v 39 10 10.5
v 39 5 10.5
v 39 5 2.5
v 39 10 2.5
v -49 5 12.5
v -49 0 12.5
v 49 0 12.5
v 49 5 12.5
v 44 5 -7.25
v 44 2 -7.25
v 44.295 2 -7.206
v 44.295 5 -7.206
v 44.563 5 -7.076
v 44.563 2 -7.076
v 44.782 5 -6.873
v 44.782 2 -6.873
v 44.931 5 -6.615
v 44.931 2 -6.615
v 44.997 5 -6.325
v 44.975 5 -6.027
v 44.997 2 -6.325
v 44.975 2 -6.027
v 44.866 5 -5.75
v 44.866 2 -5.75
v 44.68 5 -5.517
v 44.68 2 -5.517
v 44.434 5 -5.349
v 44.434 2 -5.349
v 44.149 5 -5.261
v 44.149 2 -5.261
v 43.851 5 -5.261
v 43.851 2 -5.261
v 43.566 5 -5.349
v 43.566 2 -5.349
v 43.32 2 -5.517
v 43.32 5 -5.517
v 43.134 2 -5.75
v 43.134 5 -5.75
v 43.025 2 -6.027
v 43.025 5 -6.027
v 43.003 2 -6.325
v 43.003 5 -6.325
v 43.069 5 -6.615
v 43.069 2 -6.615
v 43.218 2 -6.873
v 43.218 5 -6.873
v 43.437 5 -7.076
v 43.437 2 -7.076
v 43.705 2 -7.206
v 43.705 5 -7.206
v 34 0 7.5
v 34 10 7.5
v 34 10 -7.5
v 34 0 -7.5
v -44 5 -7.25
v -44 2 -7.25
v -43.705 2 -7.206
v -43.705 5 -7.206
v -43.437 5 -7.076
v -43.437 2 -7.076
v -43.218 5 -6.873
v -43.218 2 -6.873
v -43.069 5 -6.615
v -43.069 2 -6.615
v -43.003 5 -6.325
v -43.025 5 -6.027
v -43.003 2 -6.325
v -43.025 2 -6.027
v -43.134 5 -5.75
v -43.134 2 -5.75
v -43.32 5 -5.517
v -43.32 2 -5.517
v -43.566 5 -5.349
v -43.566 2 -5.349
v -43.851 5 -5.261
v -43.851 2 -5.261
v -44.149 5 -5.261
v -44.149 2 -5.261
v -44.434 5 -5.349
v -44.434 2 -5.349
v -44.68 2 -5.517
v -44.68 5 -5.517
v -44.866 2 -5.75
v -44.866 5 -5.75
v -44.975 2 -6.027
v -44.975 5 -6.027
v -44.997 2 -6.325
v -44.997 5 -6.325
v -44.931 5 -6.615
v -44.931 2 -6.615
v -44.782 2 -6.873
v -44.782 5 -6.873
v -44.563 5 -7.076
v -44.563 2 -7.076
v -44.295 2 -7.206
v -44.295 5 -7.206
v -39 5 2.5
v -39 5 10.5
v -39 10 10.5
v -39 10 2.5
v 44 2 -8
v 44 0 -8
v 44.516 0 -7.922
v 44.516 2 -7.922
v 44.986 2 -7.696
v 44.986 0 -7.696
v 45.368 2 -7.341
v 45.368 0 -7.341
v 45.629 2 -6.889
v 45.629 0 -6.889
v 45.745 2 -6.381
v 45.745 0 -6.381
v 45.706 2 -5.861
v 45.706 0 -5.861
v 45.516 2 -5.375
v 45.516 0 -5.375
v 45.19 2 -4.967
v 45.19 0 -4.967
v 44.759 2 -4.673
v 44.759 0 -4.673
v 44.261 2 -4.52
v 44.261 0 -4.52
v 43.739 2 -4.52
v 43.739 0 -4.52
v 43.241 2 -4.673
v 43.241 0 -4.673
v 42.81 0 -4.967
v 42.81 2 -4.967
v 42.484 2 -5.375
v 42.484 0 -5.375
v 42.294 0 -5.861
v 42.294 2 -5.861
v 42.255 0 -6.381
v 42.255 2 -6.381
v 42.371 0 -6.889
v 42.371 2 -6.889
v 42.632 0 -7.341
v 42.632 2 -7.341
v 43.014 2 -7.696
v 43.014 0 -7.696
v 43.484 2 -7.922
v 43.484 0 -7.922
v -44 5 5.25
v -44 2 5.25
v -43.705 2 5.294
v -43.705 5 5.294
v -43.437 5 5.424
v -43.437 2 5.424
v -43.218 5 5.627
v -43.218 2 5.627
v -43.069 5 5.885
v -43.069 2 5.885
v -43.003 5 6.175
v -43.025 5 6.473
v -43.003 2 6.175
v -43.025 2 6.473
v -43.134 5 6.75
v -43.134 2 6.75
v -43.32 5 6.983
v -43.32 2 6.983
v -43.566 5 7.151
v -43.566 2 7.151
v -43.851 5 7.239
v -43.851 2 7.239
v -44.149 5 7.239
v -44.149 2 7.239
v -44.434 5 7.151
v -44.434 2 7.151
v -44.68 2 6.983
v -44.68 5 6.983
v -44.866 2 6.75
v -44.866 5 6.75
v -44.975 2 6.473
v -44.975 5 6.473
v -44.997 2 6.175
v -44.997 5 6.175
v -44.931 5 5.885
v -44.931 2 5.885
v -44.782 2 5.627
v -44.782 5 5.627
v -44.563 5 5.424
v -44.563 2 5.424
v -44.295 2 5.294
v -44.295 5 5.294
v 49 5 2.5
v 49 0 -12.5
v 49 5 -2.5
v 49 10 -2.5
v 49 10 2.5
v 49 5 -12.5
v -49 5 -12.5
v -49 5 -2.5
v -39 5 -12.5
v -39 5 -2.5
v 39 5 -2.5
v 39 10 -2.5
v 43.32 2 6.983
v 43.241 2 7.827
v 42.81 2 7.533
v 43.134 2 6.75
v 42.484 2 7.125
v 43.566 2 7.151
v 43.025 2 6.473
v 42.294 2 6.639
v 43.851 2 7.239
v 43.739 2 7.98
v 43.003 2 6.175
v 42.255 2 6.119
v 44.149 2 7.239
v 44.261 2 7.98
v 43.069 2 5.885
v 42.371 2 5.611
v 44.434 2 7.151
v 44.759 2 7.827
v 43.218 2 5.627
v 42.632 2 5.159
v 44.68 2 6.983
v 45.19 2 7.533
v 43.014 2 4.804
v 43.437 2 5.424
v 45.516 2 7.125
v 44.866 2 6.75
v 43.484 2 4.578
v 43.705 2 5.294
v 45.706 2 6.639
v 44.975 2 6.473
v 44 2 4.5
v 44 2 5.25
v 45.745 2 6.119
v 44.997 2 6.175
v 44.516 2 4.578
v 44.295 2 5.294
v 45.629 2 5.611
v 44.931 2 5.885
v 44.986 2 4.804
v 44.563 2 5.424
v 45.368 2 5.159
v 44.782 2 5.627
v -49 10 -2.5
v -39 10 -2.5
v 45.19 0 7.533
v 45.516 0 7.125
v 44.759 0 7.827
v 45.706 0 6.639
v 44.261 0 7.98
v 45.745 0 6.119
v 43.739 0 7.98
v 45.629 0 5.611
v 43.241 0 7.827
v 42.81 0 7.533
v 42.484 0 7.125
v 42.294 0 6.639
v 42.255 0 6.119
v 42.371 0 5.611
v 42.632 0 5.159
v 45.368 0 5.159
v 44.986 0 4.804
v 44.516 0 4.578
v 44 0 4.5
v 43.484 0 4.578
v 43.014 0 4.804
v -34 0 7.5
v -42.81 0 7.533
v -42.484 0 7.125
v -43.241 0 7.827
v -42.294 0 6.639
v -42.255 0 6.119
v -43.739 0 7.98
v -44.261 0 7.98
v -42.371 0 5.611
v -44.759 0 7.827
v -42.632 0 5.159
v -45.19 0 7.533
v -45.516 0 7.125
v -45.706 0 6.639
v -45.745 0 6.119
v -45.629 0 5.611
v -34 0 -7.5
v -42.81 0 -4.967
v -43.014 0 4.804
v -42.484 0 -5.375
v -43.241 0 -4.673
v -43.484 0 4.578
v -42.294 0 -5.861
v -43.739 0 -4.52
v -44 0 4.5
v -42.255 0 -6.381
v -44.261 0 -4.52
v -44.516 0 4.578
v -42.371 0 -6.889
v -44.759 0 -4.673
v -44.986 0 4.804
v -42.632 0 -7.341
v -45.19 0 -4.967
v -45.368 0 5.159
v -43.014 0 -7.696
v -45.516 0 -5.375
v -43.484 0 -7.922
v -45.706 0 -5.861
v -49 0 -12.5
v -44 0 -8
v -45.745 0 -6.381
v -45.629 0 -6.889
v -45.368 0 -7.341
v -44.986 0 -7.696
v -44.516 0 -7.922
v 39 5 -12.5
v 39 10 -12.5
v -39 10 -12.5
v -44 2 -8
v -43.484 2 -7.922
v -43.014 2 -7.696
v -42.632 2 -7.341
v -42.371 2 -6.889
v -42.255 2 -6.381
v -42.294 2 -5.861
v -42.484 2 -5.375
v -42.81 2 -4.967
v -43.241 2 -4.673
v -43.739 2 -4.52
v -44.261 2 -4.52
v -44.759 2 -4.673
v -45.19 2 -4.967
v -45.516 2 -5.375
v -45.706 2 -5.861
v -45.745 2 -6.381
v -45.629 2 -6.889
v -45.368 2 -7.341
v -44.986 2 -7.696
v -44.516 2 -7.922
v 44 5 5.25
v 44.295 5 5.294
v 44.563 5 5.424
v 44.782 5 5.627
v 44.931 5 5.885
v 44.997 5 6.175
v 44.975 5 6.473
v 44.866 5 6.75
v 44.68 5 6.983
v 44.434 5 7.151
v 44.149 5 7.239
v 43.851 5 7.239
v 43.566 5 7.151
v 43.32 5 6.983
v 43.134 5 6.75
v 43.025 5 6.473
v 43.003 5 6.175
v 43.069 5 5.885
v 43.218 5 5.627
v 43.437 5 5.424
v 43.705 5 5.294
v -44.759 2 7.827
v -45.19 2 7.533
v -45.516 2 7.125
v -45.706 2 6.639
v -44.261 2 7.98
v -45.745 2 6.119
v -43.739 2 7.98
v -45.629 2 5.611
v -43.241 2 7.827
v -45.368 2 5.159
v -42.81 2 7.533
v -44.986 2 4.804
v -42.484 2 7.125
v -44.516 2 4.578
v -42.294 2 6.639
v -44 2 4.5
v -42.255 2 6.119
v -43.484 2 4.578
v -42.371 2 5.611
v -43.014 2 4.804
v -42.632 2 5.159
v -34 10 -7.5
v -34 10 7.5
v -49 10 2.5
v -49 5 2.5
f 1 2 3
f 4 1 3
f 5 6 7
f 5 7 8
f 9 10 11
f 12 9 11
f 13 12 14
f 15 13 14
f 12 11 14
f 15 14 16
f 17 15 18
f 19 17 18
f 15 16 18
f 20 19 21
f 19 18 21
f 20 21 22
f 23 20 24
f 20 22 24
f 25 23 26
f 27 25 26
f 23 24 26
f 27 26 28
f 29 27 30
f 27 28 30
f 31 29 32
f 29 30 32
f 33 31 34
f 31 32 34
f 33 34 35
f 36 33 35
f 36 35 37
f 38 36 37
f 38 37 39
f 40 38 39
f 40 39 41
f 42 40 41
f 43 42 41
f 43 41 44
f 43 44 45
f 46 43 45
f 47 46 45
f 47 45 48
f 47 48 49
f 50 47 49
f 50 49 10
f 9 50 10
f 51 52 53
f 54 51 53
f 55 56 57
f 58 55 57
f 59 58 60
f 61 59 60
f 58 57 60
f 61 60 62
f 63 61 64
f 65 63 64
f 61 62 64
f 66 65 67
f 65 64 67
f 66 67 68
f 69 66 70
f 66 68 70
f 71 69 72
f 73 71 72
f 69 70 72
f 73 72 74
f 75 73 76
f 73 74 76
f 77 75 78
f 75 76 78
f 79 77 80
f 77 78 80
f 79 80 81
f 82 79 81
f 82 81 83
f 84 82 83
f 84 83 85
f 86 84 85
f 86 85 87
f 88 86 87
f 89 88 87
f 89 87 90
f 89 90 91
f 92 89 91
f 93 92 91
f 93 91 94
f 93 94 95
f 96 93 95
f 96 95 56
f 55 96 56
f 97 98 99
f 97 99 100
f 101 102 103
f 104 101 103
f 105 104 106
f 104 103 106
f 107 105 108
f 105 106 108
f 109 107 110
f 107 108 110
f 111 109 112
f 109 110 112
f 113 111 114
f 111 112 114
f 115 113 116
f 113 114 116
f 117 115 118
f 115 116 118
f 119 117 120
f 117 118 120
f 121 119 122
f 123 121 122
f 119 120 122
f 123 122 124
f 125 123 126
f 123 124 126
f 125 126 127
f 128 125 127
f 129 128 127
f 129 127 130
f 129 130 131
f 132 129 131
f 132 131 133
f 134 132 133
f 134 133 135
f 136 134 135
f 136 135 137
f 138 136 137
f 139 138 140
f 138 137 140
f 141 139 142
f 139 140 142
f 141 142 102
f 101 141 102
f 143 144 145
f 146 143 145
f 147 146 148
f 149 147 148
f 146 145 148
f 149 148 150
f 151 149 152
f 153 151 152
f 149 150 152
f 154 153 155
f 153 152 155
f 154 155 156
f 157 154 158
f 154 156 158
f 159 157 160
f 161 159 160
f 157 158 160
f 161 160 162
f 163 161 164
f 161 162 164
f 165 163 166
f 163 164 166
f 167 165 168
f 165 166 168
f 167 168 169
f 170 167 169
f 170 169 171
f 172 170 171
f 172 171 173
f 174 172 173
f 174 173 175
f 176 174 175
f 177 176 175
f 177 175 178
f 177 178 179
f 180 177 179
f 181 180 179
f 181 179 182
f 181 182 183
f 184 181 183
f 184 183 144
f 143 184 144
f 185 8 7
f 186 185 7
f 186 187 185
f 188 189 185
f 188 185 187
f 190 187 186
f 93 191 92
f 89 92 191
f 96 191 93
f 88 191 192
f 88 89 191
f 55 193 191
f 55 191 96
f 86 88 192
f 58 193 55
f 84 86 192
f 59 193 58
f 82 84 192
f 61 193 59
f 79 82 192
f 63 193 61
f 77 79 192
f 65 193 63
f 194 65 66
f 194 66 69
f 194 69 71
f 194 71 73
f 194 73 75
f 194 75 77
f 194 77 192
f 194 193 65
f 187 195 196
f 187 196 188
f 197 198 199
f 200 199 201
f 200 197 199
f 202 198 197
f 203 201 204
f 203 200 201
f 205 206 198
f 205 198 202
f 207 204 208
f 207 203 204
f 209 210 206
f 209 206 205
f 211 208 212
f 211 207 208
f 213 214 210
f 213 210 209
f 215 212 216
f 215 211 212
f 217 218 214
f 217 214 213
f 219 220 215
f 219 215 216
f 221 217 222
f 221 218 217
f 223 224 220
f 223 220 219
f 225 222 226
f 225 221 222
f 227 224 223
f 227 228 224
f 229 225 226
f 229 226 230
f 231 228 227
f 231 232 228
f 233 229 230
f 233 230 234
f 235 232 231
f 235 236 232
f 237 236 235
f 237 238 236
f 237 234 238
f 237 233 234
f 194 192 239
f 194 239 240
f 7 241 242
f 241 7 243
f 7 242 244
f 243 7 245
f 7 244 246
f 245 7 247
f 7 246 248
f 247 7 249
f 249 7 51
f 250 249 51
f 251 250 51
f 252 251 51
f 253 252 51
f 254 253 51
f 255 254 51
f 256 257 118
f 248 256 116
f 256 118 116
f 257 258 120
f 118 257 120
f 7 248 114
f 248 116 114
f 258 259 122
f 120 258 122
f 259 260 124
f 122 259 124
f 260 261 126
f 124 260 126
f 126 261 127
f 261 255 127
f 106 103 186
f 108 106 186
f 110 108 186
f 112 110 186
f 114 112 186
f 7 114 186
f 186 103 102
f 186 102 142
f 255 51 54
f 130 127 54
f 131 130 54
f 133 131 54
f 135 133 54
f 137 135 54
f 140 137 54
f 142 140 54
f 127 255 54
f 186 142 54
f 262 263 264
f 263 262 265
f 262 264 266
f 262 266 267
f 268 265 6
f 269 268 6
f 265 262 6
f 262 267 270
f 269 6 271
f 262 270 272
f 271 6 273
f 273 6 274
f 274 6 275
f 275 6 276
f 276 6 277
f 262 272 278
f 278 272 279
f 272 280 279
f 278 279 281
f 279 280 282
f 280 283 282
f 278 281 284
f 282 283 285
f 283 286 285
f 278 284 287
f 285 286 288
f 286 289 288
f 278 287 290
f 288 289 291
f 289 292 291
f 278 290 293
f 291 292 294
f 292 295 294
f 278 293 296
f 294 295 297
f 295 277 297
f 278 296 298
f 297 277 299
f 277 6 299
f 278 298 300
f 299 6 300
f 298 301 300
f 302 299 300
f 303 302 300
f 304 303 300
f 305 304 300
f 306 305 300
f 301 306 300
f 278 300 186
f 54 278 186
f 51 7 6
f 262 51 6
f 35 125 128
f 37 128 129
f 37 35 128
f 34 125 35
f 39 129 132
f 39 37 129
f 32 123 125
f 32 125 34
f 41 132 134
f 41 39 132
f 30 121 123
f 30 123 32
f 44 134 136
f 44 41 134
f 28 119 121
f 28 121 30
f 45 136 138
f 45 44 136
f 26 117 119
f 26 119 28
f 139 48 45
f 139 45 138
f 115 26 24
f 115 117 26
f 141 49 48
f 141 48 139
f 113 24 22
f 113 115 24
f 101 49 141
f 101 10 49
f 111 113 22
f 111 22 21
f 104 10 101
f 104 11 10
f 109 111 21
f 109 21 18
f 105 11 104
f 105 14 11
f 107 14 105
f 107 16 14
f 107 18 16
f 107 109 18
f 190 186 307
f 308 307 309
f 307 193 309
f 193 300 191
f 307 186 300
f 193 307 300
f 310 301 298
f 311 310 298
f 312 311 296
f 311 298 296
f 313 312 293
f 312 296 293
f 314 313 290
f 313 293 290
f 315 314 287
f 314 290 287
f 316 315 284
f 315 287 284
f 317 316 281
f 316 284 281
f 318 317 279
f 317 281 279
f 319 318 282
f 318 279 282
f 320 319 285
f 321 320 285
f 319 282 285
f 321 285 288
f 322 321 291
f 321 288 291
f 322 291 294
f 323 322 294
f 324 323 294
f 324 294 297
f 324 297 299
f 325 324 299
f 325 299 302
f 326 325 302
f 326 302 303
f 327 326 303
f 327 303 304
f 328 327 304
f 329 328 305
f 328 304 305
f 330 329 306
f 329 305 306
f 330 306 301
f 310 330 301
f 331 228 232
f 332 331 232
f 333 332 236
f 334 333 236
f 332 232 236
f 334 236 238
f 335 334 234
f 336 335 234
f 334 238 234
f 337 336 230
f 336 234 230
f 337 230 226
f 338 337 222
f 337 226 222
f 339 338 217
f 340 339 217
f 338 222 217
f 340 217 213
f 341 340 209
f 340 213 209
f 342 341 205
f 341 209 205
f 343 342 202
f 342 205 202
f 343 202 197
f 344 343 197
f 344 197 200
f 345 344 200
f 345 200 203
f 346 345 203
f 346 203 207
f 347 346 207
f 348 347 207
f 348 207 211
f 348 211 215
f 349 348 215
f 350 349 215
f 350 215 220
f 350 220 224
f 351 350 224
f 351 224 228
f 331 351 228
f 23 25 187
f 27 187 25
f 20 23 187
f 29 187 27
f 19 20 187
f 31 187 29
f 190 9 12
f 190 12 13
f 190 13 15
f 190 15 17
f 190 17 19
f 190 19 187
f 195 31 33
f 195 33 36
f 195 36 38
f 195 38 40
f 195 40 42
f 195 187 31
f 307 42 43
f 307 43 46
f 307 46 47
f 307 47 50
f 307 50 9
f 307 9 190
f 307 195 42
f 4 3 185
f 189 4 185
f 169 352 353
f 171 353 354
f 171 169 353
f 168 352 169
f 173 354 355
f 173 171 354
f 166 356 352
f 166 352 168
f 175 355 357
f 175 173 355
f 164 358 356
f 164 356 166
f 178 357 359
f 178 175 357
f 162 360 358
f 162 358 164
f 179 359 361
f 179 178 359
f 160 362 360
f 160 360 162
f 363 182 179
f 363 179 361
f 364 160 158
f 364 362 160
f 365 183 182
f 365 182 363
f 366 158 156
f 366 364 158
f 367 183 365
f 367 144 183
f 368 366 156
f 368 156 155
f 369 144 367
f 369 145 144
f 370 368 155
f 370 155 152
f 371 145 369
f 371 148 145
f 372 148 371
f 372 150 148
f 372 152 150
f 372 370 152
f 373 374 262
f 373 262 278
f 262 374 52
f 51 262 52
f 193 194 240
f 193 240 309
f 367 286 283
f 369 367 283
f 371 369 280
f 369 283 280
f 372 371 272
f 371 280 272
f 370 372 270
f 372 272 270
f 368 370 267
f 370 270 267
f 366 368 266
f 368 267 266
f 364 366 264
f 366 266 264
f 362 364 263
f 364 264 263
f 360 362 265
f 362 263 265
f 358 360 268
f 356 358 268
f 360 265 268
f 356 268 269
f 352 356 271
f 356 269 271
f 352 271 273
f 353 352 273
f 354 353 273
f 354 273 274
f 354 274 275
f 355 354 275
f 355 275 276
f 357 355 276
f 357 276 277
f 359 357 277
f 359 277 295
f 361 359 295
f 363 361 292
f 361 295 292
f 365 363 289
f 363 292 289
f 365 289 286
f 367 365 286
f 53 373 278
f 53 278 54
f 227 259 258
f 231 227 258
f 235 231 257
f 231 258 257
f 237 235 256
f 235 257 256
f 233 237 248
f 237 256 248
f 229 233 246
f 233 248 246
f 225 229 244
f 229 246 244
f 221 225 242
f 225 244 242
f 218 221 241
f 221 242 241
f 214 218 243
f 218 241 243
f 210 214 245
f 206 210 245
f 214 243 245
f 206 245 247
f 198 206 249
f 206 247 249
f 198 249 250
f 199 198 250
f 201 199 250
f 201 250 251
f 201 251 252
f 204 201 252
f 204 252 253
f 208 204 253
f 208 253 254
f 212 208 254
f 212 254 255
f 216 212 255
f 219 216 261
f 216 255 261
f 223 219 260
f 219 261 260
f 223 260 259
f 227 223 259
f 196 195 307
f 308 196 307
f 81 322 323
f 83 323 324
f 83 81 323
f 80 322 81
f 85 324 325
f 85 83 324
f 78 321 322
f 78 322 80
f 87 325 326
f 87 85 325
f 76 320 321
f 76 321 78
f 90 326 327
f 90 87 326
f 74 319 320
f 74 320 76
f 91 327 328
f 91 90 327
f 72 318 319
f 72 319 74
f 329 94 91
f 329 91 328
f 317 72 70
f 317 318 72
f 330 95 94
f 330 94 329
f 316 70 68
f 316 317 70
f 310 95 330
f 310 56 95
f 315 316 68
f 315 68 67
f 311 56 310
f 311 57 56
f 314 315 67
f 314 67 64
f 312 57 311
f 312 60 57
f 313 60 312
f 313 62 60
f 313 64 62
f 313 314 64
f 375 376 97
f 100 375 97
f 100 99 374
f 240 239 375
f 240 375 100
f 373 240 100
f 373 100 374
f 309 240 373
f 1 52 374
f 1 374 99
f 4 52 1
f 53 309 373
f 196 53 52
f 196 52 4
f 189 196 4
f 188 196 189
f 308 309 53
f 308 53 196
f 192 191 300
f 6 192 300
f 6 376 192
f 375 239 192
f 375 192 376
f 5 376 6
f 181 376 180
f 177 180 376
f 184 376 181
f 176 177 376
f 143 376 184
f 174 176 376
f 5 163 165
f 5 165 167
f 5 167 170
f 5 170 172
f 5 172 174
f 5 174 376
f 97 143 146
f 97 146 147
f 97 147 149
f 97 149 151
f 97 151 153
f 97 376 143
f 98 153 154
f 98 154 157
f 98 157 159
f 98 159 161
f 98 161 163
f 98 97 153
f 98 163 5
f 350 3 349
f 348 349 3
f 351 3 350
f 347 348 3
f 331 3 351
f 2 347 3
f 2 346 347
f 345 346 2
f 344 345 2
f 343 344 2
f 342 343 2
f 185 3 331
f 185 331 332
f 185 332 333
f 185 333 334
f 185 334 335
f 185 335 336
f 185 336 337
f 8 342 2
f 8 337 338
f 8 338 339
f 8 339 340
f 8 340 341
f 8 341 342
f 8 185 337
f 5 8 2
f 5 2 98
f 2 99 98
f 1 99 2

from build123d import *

# Parameters (mm, degrees)
SKETCH1_W           = 78
SKETCH1_H           = 25
BOSS_EXTRUDE1_DEPTH = 10
SKETCH2_W           = 68
SKETCH2_H           = 15
CUT_EXTRUDE2_DEPTH  = 10
SKETCH3_W           = 25
SKETCH3_H           = 5
BOSS_EXTRUDE2_DEPTH = 10
SKETCH4_W           = 25
SKETCH4_H           = 5
BOSS_EXTRUDE3_DEPTH = 10
SKETCH6_W           = 10
SKETCH6_H           = 5
BOSS_EXTRUDE4_DEPTH = 5
SKETCH9_R           = 1.75
CUT_EXTRUDE5_DEPTH  = 2
SKETCH10_R          = 1
CUT_EXTRUDE6_DEPTH  = 13
SKETCH11_W          = 78
SKETCH11_H          = 5
CUT_EXTRUDE7_DEPTH  = 2


with BuildPart() as part:
    # Sketch1 → Boss-Extrude1 (new body)
    with BuildSketch(Plane(origin=(0, 0, 0), x_dir=(1, 0, 0), z_dir=(0, 1, 0))):
        Rectangle(SKETCH1_W, SKETCH1_H)
    extrude(amount=BOSS_EXTRUDE1_DEPTH)

    # Sketch2 → Cut-Extrude2 (cut)
    with BuildSketch(Plane(origin=(0, 10, 0), x_dir=(1, 0, 0), z_dir=(0, 1, 0))):
        Rectangle(SKETCH2_W, SKETCH2_H)
    extrude(amount=-CUT_EXTRUDE2_DEPTH, mode=Mode.SUBTRACT)

    # Sketch3 → Boss-Extrude2 (add)
    with BuildSketch(Plane.ZY.offset(39)):
        with Locations((0, 2.5)):
            Rectangle(SKETCH3_W, SKETCH3_H)
    extrude(amount=BOSS_EXTRUDE2_DEPTH)

    # Sketch4 → Boss-Extrude3 (add)
    with BuildSketch(Plane(origin=(39, 0, 0), x_dir=(0, 0, -1), z_dir=(1, 0, 0))):
        with Locations((0, 2.5)):
            Rectangle(SKETCH4_W, SKETCH4_H)
    extrude(amount=BOSS_EXTRUDE3_DEPTH)

    # Sketch6 → Boss-Extrude4 (add)
    with BuildSketch(Plane(origin=(0, 5, 0), x_dir=(1, 0, 0), z_dir=(0, 1, 0))):
        with Locations((44, 0)):
            Rectangle(SKETCH6_W, SKETCH6_H)
        with Locations((-44, 0)):
            Rectangle(SKETCH6_W, SKETCH6_H)
    extrude(amount=BOSS_EXTRUDE4_DEPTH)

    # Sketch9 → Cut-Extrude5 (cut)
    with BuildSketch(Plane.XZ):
        with Locations(Location((-44, 6.25, 0), (0, 0, 270))):
            Circle(SKETCH9_R)
        with Locations(Location((-44, -6.25, 0), (0, 0, 270))):
            Circle(SKETCH9_R)
        with Locations(Location((44, 6.25, 0), (0, 0, 270))):
            Circle(SKETCH9_R)
        with Locations(Location((44, -6.25, 0), (0, 0, 270))):
            Circle(SKETCH9_R)
    extrude(amount=-CUT_EXTRUDE5_DEPTH, mode=Mode.SUBTRACT)

    # Sketch10 → Cut-Extrude6 (cut)
    with BuildSketch(Plane.XZ.offset(-2)):
        with Locations(Location((-44, 6.25, 0), (0, 0, 270))):
            Circle(SKETCH10_R)
        with Locations(Location((-44, -6.25, 0), (0, 0, 270))):
            Circle(SKETCH10_R)
        with Locations(Location((44, 6.25, 0), (0, 0, 270))):
            Circle(SKETCH10_R)
        with Locations(Location((44, -6.25, 0), (0, 0, 270))):
            Circle(SKETCH10_R)
    extrude(amount=-CUT_EXTRUDE6_DEPTH, mode=Mode.SUBTRACT)

    # Sketch11 → Cut-Extrude7 (cut)
    with BuildSketch(Plane.XY.offset(12.5)):
        with Locations((0, 7.5)):
            Rectangle(SKETCH11_W, SKETCH11_H)
    extrude(amount=-CUT_EXTRUDE7_DEPTH, mode=Mode.SUBTRACT)


solid = part.part
